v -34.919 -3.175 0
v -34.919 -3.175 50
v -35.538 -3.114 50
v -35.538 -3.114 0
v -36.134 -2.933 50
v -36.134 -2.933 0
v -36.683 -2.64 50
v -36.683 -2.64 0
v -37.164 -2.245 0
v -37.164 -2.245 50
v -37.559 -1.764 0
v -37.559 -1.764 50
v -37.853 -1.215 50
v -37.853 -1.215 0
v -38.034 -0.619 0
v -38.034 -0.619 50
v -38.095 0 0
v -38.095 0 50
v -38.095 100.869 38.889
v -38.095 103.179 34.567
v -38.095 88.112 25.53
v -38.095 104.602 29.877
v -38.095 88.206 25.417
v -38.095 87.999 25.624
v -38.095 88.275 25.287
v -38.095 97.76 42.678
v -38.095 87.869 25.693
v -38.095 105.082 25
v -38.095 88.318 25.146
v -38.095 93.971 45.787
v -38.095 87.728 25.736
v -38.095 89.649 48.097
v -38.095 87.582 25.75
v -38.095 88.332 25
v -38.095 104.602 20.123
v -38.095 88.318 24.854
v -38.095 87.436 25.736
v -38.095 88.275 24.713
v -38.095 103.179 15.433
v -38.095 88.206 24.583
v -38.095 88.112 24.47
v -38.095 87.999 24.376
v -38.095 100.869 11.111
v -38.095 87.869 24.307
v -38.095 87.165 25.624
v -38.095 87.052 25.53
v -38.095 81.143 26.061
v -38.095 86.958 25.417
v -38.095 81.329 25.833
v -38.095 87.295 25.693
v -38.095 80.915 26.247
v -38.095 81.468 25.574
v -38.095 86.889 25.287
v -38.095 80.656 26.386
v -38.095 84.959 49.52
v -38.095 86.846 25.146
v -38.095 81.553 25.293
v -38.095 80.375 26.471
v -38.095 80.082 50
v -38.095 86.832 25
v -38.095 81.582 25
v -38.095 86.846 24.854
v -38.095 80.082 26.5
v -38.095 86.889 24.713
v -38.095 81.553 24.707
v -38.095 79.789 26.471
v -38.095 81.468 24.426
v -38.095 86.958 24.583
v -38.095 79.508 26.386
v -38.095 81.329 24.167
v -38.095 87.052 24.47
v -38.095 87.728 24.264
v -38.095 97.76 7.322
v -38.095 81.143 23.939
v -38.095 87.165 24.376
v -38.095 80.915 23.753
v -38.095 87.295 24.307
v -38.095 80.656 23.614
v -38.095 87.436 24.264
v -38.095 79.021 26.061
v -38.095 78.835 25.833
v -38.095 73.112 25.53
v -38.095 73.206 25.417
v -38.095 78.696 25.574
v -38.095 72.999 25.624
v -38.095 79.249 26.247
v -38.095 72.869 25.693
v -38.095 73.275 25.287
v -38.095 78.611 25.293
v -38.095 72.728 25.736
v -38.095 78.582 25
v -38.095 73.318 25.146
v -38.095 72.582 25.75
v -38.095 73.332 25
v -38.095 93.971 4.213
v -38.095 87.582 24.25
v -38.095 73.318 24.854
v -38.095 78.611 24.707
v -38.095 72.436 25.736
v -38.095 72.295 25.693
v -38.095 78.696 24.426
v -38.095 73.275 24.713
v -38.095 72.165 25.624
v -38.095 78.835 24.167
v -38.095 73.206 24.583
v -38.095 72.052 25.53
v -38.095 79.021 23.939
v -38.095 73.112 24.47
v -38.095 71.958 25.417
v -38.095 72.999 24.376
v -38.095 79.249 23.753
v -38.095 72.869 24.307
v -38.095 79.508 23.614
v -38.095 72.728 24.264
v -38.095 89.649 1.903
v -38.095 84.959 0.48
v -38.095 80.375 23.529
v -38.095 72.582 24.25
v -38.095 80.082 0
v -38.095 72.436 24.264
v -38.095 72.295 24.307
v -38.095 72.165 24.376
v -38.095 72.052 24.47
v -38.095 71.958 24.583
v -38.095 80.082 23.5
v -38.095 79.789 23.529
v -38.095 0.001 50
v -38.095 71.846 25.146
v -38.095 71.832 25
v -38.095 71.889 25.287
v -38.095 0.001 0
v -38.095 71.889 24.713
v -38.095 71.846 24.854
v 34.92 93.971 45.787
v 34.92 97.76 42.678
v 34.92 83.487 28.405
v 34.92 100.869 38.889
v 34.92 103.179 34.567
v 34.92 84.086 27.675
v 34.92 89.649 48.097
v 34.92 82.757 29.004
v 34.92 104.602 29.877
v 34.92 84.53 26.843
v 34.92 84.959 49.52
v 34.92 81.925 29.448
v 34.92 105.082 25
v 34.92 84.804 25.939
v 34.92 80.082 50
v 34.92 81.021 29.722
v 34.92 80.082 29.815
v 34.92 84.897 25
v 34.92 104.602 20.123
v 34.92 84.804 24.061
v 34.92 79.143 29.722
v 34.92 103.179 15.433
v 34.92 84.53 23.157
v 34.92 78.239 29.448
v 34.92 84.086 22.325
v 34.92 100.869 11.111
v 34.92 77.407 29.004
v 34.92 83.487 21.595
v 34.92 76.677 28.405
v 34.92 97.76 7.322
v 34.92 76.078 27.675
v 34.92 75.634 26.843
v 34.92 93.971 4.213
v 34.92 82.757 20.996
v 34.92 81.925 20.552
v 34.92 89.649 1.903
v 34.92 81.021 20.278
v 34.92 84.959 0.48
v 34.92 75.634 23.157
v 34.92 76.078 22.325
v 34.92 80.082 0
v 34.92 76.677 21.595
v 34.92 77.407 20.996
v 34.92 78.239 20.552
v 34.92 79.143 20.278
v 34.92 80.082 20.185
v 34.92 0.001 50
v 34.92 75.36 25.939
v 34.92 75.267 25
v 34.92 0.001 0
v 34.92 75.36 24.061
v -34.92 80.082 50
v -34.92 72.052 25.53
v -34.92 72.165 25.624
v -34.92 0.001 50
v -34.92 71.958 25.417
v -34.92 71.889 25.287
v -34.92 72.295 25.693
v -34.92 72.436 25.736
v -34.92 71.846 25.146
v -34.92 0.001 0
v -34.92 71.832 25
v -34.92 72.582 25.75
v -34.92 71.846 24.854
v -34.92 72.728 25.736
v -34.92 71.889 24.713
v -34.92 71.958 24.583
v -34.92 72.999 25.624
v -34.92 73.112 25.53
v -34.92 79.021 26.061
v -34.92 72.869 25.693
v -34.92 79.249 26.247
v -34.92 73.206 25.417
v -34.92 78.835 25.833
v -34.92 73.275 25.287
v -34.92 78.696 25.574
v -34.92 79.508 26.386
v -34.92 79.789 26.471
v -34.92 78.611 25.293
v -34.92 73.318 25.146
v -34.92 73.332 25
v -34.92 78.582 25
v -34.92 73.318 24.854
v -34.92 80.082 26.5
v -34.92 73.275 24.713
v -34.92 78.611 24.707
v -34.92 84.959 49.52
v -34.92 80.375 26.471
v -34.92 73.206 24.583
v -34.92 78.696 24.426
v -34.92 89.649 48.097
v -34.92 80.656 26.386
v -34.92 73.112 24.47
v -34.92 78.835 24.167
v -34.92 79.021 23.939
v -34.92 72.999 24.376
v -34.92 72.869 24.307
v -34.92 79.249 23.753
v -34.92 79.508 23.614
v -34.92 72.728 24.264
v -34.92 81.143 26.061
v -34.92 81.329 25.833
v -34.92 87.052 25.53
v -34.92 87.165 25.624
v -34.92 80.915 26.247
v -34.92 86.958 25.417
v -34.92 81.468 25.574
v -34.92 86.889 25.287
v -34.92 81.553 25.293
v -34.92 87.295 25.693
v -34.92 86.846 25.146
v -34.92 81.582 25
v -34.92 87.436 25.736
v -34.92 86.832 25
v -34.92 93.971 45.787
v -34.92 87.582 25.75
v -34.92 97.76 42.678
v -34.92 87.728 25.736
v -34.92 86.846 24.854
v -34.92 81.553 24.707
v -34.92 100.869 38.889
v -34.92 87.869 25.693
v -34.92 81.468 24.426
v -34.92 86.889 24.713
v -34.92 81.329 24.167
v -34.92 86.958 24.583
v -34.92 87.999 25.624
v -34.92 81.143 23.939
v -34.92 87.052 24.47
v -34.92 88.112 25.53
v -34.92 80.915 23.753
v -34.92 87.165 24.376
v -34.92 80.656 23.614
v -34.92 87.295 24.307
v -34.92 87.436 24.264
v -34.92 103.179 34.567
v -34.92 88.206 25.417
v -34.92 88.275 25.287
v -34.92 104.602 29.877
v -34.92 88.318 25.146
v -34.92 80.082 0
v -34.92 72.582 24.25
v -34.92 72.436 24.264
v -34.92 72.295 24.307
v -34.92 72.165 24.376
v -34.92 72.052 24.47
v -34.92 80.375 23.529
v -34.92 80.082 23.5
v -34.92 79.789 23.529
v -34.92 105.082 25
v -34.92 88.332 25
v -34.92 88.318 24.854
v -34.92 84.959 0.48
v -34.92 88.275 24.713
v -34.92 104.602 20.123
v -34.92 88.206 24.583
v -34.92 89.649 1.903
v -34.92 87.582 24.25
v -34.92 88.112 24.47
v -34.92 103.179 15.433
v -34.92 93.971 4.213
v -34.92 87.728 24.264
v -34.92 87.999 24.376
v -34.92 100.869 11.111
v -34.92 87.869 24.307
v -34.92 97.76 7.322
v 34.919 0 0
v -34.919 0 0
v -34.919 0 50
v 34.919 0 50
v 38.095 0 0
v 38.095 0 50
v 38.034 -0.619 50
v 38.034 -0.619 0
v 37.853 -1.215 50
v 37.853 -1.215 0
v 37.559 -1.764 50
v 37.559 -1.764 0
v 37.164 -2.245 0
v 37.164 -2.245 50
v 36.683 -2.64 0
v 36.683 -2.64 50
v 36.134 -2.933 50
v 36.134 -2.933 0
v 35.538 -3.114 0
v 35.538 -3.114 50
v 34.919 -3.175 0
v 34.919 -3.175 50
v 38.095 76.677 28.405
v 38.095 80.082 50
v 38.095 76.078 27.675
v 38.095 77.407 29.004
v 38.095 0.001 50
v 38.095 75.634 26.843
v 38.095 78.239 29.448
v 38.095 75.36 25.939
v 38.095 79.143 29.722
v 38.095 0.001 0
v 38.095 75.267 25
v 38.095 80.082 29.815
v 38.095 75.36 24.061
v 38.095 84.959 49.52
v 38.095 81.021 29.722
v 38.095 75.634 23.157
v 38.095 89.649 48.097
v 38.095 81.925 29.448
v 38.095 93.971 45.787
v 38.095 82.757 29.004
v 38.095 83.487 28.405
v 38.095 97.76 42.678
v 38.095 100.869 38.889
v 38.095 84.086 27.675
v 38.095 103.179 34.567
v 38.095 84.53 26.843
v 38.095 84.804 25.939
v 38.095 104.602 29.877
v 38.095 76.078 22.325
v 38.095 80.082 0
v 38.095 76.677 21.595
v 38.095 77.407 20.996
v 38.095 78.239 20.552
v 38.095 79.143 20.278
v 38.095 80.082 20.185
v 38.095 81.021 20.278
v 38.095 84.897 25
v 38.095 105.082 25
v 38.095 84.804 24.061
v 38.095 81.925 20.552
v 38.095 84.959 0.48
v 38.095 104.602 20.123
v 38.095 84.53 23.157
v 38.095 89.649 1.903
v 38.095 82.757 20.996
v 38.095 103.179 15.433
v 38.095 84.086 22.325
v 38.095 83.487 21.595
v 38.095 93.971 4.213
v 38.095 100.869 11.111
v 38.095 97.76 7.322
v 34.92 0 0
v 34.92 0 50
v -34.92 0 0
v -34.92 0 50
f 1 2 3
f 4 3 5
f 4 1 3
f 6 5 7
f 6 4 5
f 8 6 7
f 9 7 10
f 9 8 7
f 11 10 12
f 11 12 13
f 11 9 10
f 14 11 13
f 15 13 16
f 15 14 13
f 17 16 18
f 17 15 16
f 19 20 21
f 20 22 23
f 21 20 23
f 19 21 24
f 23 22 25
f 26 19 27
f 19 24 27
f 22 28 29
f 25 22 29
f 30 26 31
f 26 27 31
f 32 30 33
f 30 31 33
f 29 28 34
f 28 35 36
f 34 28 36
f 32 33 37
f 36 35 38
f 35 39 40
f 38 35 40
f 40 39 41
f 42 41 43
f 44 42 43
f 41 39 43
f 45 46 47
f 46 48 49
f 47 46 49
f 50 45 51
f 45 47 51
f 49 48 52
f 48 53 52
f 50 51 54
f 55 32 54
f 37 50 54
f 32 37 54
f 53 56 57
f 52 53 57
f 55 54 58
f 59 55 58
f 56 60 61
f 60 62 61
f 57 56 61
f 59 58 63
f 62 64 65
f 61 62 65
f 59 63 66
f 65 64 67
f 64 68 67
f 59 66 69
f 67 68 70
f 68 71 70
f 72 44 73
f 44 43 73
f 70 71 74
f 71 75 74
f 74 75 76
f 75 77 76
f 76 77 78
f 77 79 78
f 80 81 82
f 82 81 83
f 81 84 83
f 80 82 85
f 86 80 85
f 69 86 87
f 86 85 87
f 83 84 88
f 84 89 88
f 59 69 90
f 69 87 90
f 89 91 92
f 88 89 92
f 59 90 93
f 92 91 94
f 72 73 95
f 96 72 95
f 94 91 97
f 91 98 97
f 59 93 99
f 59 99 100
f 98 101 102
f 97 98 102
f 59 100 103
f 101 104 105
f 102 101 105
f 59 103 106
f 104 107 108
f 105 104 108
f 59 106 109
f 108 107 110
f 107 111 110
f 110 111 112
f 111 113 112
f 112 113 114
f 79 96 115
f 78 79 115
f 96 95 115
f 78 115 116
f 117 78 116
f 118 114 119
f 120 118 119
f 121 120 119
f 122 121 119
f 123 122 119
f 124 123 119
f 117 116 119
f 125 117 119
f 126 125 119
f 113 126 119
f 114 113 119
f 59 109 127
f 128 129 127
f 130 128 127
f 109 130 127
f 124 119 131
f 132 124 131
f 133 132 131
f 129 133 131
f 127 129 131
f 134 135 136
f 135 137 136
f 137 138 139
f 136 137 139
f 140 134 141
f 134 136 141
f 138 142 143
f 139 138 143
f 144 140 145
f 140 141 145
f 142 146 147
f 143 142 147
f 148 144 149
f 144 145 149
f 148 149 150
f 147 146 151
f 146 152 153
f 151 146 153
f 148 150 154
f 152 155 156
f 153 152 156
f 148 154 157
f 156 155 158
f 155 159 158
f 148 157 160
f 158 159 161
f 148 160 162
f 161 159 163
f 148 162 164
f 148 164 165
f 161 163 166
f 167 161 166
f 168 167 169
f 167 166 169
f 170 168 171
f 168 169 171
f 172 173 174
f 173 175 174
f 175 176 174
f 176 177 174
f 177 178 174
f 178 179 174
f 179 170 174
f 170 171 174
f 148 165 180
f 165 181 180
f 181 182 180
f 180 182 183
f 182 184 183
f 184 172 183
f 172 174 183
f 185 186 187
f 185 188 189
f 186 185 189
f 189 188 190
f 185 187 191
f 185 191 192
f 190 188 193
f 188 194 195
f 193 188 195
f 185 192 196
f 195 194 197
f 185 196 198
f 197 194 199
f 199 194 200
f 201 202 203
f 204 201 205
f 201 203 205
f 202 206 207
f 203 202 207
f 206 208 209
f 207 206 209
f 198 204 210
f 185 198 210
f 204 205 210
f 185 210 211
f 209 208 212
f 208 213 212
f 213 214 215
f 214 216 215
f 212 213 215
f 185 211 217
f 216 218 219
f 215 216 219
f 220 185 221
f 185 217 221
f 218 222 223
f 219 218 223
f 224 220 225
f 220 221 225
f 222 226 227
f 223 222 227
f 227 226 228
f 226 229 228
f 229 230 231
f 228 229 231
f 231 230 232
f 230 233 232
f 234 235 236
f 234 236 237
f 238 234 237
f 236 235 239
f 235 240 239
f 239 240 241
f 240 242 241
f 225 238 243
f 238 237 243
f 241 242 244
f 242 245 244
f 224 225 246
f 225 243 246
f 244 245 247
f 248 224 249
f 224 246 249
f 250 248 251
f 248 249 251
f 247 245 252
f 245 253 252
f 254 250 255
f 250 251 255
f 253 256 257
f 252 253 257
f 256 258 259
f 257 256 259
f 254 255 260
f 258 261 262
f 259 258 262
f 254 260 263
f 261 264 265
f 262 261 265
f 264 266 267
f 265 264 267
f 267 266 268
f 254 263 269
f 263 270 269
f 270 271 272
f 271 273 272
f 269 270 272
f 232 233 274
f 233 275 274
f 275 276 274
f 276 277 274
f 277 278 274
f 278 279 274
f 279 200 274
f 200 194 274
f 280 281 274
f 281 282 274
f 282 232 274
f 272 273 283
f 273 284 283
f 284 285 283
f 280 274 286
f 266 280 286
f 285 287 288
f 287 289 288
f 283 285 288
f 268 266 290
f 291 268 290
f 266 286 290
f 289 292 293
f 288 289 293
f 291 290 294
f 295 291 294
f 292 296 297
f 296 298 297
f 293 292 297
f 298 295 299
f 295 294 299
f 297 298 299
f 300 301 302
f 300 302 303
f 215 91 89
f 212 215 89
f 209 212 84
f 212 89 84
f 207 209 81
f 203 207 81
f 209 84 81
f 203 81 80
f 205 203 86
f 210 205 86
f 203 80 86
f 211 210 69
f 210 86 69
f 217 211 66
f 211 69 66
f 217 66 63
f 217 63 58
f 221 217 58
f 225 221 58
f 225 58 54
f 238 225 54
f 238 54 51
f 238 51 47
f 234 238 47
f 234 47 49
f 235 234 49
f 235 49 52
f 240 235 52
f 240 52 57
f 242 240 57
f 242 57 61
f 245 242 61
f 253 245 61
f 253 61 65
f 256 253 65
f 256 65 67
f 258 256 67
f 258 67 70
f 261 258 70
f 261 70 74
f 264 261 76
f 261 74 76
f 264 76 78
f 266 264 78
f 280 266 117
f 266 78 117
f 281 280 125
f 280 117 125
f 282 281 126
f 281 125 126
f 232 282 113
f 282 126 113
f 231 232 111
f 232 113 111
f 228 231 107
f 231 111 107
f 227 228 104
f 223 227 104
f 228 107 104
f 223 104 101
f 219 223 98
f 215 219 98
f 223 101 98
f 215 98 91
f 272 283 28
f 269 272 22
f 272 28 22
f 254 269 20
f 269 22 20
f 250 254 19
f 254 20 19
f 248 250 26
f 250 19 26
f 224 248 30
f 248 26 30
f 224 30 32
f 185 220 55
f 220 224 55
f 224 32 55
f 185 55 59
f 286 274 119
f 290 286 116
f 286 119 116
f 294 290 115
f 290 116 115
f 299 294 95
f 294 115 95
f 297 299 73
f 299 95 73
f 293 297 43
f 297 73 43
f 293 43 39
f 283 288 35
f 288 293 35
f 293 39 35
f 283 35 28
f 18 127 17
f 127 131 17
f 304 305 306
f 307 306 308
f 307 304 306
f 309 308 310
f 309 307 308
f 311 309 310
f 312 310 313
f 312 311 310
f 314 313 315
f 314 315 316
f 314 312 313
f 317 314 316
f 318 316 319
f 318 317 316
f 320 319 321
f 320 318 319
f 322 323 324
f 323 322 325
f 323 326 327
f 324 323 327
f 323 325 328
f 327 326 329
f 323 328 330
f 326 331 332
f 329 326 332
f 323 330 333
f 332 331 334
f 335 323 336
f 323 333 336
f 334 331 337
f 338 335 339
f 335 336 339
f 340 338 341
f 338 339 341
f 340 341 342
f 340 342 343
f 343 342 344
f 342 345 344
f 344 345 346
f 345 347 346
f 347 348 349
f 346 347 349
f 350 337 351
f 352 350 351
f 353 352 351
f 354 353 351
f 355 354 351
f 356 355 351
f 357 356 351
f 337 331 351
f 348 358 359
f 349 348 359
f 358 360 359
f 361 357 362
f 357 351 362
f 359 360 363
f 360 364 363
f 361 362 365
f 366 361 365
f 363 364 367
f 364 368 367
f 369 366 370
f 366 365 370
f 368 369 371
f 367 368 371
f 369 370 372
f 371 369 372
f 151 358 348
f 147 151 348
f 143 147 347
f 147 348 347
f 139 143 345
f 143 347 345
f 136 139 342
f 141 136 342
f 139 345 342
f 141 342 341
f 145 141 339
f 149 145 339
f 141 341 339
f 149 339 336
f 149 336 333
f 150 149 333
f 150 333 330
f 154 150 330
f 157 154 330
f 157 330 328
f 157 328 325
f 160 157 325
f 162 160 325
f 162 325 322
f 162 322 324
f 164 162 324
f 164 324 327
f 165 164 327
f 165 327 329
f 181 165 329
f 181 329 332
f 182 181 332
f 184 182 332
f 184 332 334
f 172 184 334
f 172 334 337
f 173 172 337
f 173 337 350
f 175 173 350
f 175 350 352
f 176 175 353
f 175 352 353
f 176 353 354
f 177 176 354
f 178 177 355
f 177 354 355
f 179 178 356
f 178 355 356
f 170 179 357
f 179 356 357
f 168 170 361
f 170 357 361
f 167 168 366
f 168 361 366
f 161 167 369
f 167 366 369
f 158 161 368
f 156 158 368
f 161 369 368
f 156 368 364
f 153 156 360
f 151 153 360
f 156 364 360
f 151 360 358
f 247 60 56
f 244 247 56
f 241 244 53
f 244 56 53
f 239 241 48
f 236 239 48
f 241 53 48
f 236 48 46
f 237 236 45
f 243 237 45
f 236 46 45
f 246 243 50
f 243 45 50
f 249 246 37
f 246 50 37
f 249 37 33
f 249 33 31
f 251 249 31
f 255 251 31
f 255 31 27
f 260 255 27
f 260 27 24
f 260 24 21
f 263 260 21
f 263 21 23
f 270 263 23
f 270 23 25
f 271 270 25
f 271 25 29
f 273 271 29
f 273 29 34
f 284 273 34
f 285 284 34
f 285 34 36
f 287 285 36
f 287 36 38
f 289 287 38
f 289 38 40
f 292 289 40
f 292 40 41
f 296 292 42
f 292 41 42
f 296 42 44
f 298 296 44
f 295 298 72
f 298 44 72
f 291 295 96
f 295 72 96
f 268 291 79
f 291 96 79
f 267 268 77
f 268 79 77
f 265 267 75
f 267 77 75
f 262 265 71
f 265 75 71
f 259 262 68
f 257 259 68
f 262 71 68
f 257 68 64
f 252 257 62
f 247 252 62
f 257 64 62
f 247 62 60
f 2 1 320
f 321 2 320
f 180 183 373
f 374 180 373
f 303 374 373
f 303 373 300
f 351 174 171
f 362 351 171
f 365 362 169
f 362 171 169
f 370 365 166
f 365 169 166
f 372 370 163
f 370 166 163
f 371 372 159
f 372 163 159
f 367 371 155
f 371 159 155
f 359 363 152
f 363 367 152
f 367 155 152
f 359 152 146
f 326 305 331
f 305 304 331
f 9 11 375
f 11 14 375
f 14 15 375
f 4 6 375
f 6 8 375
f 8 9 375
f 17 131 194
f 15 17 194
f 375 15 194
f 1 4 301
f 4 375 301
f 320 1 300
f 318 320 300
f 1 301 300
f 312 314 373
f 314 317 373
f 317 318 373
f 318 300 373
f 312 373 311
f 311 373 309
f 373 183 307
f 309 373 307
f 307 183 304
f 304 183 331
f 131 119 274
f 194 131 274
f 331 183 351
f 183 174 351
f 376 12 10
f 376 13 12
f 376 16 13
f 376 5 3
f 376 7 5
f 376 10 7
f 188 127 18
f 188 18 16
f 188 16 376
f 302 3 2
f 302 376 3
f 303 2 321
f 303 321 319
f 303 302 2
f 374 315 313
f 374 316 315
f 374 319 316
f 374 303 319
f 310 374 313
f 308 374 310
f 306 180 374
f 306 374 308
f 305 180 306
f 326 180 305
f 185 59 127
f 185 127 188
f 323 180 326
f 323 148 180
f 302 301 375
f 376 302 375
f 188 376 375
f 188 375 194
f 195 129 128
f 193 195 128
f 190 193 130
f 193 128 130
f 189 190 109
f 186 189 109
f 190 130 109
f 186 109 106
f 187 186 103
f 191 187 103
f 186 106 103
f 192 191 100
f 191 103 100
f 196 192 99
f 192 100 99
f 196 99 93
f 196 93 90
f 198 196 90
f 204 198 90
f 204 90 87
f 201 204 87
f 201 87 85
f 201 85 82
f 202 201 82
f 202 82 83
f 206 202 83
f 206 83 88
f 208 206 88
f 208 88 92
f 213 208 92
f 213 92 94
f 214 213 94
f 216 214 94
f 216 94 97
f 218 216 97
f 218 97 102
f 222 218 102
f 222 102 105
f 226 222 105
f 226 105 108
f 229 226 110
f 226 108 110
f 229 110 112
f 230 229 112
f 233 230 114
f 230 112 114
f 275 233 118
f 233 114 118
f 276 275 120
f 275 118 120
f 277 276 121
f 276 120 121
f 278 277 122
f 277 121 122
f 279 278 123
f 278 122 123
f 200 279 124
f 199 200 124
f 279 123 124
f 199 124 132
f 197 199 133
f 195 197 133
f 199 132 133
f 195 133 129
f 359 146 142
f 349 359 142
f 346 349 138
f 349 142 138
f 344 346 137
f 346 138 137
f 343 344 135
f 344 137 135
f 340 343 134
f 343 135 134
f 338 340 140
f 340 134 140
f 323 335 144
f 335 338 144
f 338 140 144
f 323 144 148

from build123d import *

# Parameters (mm, degrees)
SKETCH1_W              = 300
SKETCH1_H              = 50
BASE_FLANGE1_DEPTH     = 3.175
SKETCHED_BEND2_DEPTH   = 50
SKETCHED_BEND2_2_DEPTH = 50
SKETCH7_R              = 4.815
CUT_EXTRUDE1_DEPTH     = 10
SKETCH8_R              = 1.5
SKETCH8_R_2            = 0.75
CUT_EXTRUDE2_DEPTH     = 10
CUT_EXTRUDE3_DEPTH     = 140.094007146


# Read off the part's stored shape, not the designer's step: Sketched Bend2
# Sheet-metal steps are written as plain solids
with BuildPart() as part:
    # Sketch1 → Base-Flange1 (new body)
    with BuildSketch(Plane(origin=(0, 0, 0), x_dir=(1, 0, 0), z_dir=(0, 1, 0))):
        with Locations((0, -25)):
            Rectangle(SKETCH1_W, SKETCH1_H)
    extrude(amount=-BASE_FLANGE1_DEPTH)

    # Sketched Bend2 outline → Sketched Bend2 (cut)
    with BuildSketch(Plane.XY):
        with BuildLine():
            Line((-150, -3.175), (-34.919, -3.175))
            ThreePointArc((-34.919, -3.175), (-37.164417556, -2.245124663), (-38.094999843, 0))
            Line((-38.094999843, 0), (-150, 0))
            Line((-150, 0), (-150, -3.175))
        make_face()
        with BuildLine():
            ThreePointArc((38.094999843, 0), (37.164417556, -2.245124663), (34.919, -3.175))
            Line((34.919, -3.175), (150, -3.175))
            Line((150, -3.175), (150, 0))
            Line((150, 0), (38.094999843, 0))
        make_face()
    extrude(amount=SKETCHED_BEND2_DEPTH, mode=Mode.SUBTRACT)

    # Sketched Bend2 2 outline → Sketched Bend2 2 (add)
    with BuildSketch(Plane.XY):
        with BuildLine():
            ThreePointArc((-38.095, 0.001), (-38.094999961, 0.0005), (-38.094999843, 0))
            Line((-38.094999843, 0), (-34.919, 0))
            ThreePointArc((-34.919, 0), (-34.919707107, 0.000292893), (-34.92, 0.001))
            Line((-34.92, 0.001), (-34.92, 105.082))
            Line((-34.92, 105.082), (-38.095, 105.082))
            Line((-38.095, 105.082), (-38.095, 0.001))
        make_face()
        with BuildLine():
            Line((34.919, 0), (38.094999843, 0))
            ThreePointArc((38.094999843, 0), (38.094999961, 0.0005), (38.095, 0.001))
            Line((38.095, 0.001), (38.095, 105.082))
            Line((38.095, 105.082), (34.92, 105.082))
            Line((34.92, 105.082), (34.92, 0.001))
            ThreePointArc((34.92, 0.001), (34.919707107, 0.000292893), (34.919, 0))
        make_face()
    extrude(amount=SKETCHED_BEND2_2_DEPTH)

    # Sketch7 → Cut-Extrude1 (cut)
    with BuildSketch(Plane(origin=(38.095, 0, 0), x_dir=(0, 0, -1), z_dir=(1, 0, 0))):
        with Locations(Location((-25, 80.082, 0), (0, 0, 90))):
            Circle(SKETCH7_R)
    extrude(amount=-CUT_EXTRUDE1_DEPTH, mode=Mode.SUBTRACT)

    # Sketch8 → Cut-Extrude2 (cut)
    with BuildSketch(Plane.ZY.offset(38.095)):
        with Locations(Location((25, 80.082, 0), (0, 0, 270))):
            Circle(SKETCH8_R)
        with Locations(Location((25, 87.582, 0), (0, 0, 270))):
            Circle(SKETCH8_R_2)
        with Locations(Location((25, 72.582, 0), (0, 0, 270))):
            Circle(SKETCH8_R_2)
    extrude(amount=-CUT_EXTRUDE2_DEPTH, mode=Mode.SUBTRACT)

    # Sketch9 → Cut-Extrude3 (cut, through all)
    with BuildSketch(Plane.ZY.offset(38.095)):
        with BuildLine():
            Line((0, 105.082), (0, 80.082))
            ThreePointArc((0, 80.082), (7.32233047, 97.75966953), (25, 105.082))
            Line((25, 105.082), (0, 105.082))
        make_face()
        with BuildLine():
            ThreePointArc((25, 105.082), (42.67766953, 97.75966953), (50, 80.082))
            Line((50, 80.082), (50, 105.082))
            Line((50, 105.082), (25, 105.082))
        make_face()
    extrude(amount=-CUT_EXTRUDE3_DEPTH, mode=Mode.SUBTRACT)


solid = part.part
